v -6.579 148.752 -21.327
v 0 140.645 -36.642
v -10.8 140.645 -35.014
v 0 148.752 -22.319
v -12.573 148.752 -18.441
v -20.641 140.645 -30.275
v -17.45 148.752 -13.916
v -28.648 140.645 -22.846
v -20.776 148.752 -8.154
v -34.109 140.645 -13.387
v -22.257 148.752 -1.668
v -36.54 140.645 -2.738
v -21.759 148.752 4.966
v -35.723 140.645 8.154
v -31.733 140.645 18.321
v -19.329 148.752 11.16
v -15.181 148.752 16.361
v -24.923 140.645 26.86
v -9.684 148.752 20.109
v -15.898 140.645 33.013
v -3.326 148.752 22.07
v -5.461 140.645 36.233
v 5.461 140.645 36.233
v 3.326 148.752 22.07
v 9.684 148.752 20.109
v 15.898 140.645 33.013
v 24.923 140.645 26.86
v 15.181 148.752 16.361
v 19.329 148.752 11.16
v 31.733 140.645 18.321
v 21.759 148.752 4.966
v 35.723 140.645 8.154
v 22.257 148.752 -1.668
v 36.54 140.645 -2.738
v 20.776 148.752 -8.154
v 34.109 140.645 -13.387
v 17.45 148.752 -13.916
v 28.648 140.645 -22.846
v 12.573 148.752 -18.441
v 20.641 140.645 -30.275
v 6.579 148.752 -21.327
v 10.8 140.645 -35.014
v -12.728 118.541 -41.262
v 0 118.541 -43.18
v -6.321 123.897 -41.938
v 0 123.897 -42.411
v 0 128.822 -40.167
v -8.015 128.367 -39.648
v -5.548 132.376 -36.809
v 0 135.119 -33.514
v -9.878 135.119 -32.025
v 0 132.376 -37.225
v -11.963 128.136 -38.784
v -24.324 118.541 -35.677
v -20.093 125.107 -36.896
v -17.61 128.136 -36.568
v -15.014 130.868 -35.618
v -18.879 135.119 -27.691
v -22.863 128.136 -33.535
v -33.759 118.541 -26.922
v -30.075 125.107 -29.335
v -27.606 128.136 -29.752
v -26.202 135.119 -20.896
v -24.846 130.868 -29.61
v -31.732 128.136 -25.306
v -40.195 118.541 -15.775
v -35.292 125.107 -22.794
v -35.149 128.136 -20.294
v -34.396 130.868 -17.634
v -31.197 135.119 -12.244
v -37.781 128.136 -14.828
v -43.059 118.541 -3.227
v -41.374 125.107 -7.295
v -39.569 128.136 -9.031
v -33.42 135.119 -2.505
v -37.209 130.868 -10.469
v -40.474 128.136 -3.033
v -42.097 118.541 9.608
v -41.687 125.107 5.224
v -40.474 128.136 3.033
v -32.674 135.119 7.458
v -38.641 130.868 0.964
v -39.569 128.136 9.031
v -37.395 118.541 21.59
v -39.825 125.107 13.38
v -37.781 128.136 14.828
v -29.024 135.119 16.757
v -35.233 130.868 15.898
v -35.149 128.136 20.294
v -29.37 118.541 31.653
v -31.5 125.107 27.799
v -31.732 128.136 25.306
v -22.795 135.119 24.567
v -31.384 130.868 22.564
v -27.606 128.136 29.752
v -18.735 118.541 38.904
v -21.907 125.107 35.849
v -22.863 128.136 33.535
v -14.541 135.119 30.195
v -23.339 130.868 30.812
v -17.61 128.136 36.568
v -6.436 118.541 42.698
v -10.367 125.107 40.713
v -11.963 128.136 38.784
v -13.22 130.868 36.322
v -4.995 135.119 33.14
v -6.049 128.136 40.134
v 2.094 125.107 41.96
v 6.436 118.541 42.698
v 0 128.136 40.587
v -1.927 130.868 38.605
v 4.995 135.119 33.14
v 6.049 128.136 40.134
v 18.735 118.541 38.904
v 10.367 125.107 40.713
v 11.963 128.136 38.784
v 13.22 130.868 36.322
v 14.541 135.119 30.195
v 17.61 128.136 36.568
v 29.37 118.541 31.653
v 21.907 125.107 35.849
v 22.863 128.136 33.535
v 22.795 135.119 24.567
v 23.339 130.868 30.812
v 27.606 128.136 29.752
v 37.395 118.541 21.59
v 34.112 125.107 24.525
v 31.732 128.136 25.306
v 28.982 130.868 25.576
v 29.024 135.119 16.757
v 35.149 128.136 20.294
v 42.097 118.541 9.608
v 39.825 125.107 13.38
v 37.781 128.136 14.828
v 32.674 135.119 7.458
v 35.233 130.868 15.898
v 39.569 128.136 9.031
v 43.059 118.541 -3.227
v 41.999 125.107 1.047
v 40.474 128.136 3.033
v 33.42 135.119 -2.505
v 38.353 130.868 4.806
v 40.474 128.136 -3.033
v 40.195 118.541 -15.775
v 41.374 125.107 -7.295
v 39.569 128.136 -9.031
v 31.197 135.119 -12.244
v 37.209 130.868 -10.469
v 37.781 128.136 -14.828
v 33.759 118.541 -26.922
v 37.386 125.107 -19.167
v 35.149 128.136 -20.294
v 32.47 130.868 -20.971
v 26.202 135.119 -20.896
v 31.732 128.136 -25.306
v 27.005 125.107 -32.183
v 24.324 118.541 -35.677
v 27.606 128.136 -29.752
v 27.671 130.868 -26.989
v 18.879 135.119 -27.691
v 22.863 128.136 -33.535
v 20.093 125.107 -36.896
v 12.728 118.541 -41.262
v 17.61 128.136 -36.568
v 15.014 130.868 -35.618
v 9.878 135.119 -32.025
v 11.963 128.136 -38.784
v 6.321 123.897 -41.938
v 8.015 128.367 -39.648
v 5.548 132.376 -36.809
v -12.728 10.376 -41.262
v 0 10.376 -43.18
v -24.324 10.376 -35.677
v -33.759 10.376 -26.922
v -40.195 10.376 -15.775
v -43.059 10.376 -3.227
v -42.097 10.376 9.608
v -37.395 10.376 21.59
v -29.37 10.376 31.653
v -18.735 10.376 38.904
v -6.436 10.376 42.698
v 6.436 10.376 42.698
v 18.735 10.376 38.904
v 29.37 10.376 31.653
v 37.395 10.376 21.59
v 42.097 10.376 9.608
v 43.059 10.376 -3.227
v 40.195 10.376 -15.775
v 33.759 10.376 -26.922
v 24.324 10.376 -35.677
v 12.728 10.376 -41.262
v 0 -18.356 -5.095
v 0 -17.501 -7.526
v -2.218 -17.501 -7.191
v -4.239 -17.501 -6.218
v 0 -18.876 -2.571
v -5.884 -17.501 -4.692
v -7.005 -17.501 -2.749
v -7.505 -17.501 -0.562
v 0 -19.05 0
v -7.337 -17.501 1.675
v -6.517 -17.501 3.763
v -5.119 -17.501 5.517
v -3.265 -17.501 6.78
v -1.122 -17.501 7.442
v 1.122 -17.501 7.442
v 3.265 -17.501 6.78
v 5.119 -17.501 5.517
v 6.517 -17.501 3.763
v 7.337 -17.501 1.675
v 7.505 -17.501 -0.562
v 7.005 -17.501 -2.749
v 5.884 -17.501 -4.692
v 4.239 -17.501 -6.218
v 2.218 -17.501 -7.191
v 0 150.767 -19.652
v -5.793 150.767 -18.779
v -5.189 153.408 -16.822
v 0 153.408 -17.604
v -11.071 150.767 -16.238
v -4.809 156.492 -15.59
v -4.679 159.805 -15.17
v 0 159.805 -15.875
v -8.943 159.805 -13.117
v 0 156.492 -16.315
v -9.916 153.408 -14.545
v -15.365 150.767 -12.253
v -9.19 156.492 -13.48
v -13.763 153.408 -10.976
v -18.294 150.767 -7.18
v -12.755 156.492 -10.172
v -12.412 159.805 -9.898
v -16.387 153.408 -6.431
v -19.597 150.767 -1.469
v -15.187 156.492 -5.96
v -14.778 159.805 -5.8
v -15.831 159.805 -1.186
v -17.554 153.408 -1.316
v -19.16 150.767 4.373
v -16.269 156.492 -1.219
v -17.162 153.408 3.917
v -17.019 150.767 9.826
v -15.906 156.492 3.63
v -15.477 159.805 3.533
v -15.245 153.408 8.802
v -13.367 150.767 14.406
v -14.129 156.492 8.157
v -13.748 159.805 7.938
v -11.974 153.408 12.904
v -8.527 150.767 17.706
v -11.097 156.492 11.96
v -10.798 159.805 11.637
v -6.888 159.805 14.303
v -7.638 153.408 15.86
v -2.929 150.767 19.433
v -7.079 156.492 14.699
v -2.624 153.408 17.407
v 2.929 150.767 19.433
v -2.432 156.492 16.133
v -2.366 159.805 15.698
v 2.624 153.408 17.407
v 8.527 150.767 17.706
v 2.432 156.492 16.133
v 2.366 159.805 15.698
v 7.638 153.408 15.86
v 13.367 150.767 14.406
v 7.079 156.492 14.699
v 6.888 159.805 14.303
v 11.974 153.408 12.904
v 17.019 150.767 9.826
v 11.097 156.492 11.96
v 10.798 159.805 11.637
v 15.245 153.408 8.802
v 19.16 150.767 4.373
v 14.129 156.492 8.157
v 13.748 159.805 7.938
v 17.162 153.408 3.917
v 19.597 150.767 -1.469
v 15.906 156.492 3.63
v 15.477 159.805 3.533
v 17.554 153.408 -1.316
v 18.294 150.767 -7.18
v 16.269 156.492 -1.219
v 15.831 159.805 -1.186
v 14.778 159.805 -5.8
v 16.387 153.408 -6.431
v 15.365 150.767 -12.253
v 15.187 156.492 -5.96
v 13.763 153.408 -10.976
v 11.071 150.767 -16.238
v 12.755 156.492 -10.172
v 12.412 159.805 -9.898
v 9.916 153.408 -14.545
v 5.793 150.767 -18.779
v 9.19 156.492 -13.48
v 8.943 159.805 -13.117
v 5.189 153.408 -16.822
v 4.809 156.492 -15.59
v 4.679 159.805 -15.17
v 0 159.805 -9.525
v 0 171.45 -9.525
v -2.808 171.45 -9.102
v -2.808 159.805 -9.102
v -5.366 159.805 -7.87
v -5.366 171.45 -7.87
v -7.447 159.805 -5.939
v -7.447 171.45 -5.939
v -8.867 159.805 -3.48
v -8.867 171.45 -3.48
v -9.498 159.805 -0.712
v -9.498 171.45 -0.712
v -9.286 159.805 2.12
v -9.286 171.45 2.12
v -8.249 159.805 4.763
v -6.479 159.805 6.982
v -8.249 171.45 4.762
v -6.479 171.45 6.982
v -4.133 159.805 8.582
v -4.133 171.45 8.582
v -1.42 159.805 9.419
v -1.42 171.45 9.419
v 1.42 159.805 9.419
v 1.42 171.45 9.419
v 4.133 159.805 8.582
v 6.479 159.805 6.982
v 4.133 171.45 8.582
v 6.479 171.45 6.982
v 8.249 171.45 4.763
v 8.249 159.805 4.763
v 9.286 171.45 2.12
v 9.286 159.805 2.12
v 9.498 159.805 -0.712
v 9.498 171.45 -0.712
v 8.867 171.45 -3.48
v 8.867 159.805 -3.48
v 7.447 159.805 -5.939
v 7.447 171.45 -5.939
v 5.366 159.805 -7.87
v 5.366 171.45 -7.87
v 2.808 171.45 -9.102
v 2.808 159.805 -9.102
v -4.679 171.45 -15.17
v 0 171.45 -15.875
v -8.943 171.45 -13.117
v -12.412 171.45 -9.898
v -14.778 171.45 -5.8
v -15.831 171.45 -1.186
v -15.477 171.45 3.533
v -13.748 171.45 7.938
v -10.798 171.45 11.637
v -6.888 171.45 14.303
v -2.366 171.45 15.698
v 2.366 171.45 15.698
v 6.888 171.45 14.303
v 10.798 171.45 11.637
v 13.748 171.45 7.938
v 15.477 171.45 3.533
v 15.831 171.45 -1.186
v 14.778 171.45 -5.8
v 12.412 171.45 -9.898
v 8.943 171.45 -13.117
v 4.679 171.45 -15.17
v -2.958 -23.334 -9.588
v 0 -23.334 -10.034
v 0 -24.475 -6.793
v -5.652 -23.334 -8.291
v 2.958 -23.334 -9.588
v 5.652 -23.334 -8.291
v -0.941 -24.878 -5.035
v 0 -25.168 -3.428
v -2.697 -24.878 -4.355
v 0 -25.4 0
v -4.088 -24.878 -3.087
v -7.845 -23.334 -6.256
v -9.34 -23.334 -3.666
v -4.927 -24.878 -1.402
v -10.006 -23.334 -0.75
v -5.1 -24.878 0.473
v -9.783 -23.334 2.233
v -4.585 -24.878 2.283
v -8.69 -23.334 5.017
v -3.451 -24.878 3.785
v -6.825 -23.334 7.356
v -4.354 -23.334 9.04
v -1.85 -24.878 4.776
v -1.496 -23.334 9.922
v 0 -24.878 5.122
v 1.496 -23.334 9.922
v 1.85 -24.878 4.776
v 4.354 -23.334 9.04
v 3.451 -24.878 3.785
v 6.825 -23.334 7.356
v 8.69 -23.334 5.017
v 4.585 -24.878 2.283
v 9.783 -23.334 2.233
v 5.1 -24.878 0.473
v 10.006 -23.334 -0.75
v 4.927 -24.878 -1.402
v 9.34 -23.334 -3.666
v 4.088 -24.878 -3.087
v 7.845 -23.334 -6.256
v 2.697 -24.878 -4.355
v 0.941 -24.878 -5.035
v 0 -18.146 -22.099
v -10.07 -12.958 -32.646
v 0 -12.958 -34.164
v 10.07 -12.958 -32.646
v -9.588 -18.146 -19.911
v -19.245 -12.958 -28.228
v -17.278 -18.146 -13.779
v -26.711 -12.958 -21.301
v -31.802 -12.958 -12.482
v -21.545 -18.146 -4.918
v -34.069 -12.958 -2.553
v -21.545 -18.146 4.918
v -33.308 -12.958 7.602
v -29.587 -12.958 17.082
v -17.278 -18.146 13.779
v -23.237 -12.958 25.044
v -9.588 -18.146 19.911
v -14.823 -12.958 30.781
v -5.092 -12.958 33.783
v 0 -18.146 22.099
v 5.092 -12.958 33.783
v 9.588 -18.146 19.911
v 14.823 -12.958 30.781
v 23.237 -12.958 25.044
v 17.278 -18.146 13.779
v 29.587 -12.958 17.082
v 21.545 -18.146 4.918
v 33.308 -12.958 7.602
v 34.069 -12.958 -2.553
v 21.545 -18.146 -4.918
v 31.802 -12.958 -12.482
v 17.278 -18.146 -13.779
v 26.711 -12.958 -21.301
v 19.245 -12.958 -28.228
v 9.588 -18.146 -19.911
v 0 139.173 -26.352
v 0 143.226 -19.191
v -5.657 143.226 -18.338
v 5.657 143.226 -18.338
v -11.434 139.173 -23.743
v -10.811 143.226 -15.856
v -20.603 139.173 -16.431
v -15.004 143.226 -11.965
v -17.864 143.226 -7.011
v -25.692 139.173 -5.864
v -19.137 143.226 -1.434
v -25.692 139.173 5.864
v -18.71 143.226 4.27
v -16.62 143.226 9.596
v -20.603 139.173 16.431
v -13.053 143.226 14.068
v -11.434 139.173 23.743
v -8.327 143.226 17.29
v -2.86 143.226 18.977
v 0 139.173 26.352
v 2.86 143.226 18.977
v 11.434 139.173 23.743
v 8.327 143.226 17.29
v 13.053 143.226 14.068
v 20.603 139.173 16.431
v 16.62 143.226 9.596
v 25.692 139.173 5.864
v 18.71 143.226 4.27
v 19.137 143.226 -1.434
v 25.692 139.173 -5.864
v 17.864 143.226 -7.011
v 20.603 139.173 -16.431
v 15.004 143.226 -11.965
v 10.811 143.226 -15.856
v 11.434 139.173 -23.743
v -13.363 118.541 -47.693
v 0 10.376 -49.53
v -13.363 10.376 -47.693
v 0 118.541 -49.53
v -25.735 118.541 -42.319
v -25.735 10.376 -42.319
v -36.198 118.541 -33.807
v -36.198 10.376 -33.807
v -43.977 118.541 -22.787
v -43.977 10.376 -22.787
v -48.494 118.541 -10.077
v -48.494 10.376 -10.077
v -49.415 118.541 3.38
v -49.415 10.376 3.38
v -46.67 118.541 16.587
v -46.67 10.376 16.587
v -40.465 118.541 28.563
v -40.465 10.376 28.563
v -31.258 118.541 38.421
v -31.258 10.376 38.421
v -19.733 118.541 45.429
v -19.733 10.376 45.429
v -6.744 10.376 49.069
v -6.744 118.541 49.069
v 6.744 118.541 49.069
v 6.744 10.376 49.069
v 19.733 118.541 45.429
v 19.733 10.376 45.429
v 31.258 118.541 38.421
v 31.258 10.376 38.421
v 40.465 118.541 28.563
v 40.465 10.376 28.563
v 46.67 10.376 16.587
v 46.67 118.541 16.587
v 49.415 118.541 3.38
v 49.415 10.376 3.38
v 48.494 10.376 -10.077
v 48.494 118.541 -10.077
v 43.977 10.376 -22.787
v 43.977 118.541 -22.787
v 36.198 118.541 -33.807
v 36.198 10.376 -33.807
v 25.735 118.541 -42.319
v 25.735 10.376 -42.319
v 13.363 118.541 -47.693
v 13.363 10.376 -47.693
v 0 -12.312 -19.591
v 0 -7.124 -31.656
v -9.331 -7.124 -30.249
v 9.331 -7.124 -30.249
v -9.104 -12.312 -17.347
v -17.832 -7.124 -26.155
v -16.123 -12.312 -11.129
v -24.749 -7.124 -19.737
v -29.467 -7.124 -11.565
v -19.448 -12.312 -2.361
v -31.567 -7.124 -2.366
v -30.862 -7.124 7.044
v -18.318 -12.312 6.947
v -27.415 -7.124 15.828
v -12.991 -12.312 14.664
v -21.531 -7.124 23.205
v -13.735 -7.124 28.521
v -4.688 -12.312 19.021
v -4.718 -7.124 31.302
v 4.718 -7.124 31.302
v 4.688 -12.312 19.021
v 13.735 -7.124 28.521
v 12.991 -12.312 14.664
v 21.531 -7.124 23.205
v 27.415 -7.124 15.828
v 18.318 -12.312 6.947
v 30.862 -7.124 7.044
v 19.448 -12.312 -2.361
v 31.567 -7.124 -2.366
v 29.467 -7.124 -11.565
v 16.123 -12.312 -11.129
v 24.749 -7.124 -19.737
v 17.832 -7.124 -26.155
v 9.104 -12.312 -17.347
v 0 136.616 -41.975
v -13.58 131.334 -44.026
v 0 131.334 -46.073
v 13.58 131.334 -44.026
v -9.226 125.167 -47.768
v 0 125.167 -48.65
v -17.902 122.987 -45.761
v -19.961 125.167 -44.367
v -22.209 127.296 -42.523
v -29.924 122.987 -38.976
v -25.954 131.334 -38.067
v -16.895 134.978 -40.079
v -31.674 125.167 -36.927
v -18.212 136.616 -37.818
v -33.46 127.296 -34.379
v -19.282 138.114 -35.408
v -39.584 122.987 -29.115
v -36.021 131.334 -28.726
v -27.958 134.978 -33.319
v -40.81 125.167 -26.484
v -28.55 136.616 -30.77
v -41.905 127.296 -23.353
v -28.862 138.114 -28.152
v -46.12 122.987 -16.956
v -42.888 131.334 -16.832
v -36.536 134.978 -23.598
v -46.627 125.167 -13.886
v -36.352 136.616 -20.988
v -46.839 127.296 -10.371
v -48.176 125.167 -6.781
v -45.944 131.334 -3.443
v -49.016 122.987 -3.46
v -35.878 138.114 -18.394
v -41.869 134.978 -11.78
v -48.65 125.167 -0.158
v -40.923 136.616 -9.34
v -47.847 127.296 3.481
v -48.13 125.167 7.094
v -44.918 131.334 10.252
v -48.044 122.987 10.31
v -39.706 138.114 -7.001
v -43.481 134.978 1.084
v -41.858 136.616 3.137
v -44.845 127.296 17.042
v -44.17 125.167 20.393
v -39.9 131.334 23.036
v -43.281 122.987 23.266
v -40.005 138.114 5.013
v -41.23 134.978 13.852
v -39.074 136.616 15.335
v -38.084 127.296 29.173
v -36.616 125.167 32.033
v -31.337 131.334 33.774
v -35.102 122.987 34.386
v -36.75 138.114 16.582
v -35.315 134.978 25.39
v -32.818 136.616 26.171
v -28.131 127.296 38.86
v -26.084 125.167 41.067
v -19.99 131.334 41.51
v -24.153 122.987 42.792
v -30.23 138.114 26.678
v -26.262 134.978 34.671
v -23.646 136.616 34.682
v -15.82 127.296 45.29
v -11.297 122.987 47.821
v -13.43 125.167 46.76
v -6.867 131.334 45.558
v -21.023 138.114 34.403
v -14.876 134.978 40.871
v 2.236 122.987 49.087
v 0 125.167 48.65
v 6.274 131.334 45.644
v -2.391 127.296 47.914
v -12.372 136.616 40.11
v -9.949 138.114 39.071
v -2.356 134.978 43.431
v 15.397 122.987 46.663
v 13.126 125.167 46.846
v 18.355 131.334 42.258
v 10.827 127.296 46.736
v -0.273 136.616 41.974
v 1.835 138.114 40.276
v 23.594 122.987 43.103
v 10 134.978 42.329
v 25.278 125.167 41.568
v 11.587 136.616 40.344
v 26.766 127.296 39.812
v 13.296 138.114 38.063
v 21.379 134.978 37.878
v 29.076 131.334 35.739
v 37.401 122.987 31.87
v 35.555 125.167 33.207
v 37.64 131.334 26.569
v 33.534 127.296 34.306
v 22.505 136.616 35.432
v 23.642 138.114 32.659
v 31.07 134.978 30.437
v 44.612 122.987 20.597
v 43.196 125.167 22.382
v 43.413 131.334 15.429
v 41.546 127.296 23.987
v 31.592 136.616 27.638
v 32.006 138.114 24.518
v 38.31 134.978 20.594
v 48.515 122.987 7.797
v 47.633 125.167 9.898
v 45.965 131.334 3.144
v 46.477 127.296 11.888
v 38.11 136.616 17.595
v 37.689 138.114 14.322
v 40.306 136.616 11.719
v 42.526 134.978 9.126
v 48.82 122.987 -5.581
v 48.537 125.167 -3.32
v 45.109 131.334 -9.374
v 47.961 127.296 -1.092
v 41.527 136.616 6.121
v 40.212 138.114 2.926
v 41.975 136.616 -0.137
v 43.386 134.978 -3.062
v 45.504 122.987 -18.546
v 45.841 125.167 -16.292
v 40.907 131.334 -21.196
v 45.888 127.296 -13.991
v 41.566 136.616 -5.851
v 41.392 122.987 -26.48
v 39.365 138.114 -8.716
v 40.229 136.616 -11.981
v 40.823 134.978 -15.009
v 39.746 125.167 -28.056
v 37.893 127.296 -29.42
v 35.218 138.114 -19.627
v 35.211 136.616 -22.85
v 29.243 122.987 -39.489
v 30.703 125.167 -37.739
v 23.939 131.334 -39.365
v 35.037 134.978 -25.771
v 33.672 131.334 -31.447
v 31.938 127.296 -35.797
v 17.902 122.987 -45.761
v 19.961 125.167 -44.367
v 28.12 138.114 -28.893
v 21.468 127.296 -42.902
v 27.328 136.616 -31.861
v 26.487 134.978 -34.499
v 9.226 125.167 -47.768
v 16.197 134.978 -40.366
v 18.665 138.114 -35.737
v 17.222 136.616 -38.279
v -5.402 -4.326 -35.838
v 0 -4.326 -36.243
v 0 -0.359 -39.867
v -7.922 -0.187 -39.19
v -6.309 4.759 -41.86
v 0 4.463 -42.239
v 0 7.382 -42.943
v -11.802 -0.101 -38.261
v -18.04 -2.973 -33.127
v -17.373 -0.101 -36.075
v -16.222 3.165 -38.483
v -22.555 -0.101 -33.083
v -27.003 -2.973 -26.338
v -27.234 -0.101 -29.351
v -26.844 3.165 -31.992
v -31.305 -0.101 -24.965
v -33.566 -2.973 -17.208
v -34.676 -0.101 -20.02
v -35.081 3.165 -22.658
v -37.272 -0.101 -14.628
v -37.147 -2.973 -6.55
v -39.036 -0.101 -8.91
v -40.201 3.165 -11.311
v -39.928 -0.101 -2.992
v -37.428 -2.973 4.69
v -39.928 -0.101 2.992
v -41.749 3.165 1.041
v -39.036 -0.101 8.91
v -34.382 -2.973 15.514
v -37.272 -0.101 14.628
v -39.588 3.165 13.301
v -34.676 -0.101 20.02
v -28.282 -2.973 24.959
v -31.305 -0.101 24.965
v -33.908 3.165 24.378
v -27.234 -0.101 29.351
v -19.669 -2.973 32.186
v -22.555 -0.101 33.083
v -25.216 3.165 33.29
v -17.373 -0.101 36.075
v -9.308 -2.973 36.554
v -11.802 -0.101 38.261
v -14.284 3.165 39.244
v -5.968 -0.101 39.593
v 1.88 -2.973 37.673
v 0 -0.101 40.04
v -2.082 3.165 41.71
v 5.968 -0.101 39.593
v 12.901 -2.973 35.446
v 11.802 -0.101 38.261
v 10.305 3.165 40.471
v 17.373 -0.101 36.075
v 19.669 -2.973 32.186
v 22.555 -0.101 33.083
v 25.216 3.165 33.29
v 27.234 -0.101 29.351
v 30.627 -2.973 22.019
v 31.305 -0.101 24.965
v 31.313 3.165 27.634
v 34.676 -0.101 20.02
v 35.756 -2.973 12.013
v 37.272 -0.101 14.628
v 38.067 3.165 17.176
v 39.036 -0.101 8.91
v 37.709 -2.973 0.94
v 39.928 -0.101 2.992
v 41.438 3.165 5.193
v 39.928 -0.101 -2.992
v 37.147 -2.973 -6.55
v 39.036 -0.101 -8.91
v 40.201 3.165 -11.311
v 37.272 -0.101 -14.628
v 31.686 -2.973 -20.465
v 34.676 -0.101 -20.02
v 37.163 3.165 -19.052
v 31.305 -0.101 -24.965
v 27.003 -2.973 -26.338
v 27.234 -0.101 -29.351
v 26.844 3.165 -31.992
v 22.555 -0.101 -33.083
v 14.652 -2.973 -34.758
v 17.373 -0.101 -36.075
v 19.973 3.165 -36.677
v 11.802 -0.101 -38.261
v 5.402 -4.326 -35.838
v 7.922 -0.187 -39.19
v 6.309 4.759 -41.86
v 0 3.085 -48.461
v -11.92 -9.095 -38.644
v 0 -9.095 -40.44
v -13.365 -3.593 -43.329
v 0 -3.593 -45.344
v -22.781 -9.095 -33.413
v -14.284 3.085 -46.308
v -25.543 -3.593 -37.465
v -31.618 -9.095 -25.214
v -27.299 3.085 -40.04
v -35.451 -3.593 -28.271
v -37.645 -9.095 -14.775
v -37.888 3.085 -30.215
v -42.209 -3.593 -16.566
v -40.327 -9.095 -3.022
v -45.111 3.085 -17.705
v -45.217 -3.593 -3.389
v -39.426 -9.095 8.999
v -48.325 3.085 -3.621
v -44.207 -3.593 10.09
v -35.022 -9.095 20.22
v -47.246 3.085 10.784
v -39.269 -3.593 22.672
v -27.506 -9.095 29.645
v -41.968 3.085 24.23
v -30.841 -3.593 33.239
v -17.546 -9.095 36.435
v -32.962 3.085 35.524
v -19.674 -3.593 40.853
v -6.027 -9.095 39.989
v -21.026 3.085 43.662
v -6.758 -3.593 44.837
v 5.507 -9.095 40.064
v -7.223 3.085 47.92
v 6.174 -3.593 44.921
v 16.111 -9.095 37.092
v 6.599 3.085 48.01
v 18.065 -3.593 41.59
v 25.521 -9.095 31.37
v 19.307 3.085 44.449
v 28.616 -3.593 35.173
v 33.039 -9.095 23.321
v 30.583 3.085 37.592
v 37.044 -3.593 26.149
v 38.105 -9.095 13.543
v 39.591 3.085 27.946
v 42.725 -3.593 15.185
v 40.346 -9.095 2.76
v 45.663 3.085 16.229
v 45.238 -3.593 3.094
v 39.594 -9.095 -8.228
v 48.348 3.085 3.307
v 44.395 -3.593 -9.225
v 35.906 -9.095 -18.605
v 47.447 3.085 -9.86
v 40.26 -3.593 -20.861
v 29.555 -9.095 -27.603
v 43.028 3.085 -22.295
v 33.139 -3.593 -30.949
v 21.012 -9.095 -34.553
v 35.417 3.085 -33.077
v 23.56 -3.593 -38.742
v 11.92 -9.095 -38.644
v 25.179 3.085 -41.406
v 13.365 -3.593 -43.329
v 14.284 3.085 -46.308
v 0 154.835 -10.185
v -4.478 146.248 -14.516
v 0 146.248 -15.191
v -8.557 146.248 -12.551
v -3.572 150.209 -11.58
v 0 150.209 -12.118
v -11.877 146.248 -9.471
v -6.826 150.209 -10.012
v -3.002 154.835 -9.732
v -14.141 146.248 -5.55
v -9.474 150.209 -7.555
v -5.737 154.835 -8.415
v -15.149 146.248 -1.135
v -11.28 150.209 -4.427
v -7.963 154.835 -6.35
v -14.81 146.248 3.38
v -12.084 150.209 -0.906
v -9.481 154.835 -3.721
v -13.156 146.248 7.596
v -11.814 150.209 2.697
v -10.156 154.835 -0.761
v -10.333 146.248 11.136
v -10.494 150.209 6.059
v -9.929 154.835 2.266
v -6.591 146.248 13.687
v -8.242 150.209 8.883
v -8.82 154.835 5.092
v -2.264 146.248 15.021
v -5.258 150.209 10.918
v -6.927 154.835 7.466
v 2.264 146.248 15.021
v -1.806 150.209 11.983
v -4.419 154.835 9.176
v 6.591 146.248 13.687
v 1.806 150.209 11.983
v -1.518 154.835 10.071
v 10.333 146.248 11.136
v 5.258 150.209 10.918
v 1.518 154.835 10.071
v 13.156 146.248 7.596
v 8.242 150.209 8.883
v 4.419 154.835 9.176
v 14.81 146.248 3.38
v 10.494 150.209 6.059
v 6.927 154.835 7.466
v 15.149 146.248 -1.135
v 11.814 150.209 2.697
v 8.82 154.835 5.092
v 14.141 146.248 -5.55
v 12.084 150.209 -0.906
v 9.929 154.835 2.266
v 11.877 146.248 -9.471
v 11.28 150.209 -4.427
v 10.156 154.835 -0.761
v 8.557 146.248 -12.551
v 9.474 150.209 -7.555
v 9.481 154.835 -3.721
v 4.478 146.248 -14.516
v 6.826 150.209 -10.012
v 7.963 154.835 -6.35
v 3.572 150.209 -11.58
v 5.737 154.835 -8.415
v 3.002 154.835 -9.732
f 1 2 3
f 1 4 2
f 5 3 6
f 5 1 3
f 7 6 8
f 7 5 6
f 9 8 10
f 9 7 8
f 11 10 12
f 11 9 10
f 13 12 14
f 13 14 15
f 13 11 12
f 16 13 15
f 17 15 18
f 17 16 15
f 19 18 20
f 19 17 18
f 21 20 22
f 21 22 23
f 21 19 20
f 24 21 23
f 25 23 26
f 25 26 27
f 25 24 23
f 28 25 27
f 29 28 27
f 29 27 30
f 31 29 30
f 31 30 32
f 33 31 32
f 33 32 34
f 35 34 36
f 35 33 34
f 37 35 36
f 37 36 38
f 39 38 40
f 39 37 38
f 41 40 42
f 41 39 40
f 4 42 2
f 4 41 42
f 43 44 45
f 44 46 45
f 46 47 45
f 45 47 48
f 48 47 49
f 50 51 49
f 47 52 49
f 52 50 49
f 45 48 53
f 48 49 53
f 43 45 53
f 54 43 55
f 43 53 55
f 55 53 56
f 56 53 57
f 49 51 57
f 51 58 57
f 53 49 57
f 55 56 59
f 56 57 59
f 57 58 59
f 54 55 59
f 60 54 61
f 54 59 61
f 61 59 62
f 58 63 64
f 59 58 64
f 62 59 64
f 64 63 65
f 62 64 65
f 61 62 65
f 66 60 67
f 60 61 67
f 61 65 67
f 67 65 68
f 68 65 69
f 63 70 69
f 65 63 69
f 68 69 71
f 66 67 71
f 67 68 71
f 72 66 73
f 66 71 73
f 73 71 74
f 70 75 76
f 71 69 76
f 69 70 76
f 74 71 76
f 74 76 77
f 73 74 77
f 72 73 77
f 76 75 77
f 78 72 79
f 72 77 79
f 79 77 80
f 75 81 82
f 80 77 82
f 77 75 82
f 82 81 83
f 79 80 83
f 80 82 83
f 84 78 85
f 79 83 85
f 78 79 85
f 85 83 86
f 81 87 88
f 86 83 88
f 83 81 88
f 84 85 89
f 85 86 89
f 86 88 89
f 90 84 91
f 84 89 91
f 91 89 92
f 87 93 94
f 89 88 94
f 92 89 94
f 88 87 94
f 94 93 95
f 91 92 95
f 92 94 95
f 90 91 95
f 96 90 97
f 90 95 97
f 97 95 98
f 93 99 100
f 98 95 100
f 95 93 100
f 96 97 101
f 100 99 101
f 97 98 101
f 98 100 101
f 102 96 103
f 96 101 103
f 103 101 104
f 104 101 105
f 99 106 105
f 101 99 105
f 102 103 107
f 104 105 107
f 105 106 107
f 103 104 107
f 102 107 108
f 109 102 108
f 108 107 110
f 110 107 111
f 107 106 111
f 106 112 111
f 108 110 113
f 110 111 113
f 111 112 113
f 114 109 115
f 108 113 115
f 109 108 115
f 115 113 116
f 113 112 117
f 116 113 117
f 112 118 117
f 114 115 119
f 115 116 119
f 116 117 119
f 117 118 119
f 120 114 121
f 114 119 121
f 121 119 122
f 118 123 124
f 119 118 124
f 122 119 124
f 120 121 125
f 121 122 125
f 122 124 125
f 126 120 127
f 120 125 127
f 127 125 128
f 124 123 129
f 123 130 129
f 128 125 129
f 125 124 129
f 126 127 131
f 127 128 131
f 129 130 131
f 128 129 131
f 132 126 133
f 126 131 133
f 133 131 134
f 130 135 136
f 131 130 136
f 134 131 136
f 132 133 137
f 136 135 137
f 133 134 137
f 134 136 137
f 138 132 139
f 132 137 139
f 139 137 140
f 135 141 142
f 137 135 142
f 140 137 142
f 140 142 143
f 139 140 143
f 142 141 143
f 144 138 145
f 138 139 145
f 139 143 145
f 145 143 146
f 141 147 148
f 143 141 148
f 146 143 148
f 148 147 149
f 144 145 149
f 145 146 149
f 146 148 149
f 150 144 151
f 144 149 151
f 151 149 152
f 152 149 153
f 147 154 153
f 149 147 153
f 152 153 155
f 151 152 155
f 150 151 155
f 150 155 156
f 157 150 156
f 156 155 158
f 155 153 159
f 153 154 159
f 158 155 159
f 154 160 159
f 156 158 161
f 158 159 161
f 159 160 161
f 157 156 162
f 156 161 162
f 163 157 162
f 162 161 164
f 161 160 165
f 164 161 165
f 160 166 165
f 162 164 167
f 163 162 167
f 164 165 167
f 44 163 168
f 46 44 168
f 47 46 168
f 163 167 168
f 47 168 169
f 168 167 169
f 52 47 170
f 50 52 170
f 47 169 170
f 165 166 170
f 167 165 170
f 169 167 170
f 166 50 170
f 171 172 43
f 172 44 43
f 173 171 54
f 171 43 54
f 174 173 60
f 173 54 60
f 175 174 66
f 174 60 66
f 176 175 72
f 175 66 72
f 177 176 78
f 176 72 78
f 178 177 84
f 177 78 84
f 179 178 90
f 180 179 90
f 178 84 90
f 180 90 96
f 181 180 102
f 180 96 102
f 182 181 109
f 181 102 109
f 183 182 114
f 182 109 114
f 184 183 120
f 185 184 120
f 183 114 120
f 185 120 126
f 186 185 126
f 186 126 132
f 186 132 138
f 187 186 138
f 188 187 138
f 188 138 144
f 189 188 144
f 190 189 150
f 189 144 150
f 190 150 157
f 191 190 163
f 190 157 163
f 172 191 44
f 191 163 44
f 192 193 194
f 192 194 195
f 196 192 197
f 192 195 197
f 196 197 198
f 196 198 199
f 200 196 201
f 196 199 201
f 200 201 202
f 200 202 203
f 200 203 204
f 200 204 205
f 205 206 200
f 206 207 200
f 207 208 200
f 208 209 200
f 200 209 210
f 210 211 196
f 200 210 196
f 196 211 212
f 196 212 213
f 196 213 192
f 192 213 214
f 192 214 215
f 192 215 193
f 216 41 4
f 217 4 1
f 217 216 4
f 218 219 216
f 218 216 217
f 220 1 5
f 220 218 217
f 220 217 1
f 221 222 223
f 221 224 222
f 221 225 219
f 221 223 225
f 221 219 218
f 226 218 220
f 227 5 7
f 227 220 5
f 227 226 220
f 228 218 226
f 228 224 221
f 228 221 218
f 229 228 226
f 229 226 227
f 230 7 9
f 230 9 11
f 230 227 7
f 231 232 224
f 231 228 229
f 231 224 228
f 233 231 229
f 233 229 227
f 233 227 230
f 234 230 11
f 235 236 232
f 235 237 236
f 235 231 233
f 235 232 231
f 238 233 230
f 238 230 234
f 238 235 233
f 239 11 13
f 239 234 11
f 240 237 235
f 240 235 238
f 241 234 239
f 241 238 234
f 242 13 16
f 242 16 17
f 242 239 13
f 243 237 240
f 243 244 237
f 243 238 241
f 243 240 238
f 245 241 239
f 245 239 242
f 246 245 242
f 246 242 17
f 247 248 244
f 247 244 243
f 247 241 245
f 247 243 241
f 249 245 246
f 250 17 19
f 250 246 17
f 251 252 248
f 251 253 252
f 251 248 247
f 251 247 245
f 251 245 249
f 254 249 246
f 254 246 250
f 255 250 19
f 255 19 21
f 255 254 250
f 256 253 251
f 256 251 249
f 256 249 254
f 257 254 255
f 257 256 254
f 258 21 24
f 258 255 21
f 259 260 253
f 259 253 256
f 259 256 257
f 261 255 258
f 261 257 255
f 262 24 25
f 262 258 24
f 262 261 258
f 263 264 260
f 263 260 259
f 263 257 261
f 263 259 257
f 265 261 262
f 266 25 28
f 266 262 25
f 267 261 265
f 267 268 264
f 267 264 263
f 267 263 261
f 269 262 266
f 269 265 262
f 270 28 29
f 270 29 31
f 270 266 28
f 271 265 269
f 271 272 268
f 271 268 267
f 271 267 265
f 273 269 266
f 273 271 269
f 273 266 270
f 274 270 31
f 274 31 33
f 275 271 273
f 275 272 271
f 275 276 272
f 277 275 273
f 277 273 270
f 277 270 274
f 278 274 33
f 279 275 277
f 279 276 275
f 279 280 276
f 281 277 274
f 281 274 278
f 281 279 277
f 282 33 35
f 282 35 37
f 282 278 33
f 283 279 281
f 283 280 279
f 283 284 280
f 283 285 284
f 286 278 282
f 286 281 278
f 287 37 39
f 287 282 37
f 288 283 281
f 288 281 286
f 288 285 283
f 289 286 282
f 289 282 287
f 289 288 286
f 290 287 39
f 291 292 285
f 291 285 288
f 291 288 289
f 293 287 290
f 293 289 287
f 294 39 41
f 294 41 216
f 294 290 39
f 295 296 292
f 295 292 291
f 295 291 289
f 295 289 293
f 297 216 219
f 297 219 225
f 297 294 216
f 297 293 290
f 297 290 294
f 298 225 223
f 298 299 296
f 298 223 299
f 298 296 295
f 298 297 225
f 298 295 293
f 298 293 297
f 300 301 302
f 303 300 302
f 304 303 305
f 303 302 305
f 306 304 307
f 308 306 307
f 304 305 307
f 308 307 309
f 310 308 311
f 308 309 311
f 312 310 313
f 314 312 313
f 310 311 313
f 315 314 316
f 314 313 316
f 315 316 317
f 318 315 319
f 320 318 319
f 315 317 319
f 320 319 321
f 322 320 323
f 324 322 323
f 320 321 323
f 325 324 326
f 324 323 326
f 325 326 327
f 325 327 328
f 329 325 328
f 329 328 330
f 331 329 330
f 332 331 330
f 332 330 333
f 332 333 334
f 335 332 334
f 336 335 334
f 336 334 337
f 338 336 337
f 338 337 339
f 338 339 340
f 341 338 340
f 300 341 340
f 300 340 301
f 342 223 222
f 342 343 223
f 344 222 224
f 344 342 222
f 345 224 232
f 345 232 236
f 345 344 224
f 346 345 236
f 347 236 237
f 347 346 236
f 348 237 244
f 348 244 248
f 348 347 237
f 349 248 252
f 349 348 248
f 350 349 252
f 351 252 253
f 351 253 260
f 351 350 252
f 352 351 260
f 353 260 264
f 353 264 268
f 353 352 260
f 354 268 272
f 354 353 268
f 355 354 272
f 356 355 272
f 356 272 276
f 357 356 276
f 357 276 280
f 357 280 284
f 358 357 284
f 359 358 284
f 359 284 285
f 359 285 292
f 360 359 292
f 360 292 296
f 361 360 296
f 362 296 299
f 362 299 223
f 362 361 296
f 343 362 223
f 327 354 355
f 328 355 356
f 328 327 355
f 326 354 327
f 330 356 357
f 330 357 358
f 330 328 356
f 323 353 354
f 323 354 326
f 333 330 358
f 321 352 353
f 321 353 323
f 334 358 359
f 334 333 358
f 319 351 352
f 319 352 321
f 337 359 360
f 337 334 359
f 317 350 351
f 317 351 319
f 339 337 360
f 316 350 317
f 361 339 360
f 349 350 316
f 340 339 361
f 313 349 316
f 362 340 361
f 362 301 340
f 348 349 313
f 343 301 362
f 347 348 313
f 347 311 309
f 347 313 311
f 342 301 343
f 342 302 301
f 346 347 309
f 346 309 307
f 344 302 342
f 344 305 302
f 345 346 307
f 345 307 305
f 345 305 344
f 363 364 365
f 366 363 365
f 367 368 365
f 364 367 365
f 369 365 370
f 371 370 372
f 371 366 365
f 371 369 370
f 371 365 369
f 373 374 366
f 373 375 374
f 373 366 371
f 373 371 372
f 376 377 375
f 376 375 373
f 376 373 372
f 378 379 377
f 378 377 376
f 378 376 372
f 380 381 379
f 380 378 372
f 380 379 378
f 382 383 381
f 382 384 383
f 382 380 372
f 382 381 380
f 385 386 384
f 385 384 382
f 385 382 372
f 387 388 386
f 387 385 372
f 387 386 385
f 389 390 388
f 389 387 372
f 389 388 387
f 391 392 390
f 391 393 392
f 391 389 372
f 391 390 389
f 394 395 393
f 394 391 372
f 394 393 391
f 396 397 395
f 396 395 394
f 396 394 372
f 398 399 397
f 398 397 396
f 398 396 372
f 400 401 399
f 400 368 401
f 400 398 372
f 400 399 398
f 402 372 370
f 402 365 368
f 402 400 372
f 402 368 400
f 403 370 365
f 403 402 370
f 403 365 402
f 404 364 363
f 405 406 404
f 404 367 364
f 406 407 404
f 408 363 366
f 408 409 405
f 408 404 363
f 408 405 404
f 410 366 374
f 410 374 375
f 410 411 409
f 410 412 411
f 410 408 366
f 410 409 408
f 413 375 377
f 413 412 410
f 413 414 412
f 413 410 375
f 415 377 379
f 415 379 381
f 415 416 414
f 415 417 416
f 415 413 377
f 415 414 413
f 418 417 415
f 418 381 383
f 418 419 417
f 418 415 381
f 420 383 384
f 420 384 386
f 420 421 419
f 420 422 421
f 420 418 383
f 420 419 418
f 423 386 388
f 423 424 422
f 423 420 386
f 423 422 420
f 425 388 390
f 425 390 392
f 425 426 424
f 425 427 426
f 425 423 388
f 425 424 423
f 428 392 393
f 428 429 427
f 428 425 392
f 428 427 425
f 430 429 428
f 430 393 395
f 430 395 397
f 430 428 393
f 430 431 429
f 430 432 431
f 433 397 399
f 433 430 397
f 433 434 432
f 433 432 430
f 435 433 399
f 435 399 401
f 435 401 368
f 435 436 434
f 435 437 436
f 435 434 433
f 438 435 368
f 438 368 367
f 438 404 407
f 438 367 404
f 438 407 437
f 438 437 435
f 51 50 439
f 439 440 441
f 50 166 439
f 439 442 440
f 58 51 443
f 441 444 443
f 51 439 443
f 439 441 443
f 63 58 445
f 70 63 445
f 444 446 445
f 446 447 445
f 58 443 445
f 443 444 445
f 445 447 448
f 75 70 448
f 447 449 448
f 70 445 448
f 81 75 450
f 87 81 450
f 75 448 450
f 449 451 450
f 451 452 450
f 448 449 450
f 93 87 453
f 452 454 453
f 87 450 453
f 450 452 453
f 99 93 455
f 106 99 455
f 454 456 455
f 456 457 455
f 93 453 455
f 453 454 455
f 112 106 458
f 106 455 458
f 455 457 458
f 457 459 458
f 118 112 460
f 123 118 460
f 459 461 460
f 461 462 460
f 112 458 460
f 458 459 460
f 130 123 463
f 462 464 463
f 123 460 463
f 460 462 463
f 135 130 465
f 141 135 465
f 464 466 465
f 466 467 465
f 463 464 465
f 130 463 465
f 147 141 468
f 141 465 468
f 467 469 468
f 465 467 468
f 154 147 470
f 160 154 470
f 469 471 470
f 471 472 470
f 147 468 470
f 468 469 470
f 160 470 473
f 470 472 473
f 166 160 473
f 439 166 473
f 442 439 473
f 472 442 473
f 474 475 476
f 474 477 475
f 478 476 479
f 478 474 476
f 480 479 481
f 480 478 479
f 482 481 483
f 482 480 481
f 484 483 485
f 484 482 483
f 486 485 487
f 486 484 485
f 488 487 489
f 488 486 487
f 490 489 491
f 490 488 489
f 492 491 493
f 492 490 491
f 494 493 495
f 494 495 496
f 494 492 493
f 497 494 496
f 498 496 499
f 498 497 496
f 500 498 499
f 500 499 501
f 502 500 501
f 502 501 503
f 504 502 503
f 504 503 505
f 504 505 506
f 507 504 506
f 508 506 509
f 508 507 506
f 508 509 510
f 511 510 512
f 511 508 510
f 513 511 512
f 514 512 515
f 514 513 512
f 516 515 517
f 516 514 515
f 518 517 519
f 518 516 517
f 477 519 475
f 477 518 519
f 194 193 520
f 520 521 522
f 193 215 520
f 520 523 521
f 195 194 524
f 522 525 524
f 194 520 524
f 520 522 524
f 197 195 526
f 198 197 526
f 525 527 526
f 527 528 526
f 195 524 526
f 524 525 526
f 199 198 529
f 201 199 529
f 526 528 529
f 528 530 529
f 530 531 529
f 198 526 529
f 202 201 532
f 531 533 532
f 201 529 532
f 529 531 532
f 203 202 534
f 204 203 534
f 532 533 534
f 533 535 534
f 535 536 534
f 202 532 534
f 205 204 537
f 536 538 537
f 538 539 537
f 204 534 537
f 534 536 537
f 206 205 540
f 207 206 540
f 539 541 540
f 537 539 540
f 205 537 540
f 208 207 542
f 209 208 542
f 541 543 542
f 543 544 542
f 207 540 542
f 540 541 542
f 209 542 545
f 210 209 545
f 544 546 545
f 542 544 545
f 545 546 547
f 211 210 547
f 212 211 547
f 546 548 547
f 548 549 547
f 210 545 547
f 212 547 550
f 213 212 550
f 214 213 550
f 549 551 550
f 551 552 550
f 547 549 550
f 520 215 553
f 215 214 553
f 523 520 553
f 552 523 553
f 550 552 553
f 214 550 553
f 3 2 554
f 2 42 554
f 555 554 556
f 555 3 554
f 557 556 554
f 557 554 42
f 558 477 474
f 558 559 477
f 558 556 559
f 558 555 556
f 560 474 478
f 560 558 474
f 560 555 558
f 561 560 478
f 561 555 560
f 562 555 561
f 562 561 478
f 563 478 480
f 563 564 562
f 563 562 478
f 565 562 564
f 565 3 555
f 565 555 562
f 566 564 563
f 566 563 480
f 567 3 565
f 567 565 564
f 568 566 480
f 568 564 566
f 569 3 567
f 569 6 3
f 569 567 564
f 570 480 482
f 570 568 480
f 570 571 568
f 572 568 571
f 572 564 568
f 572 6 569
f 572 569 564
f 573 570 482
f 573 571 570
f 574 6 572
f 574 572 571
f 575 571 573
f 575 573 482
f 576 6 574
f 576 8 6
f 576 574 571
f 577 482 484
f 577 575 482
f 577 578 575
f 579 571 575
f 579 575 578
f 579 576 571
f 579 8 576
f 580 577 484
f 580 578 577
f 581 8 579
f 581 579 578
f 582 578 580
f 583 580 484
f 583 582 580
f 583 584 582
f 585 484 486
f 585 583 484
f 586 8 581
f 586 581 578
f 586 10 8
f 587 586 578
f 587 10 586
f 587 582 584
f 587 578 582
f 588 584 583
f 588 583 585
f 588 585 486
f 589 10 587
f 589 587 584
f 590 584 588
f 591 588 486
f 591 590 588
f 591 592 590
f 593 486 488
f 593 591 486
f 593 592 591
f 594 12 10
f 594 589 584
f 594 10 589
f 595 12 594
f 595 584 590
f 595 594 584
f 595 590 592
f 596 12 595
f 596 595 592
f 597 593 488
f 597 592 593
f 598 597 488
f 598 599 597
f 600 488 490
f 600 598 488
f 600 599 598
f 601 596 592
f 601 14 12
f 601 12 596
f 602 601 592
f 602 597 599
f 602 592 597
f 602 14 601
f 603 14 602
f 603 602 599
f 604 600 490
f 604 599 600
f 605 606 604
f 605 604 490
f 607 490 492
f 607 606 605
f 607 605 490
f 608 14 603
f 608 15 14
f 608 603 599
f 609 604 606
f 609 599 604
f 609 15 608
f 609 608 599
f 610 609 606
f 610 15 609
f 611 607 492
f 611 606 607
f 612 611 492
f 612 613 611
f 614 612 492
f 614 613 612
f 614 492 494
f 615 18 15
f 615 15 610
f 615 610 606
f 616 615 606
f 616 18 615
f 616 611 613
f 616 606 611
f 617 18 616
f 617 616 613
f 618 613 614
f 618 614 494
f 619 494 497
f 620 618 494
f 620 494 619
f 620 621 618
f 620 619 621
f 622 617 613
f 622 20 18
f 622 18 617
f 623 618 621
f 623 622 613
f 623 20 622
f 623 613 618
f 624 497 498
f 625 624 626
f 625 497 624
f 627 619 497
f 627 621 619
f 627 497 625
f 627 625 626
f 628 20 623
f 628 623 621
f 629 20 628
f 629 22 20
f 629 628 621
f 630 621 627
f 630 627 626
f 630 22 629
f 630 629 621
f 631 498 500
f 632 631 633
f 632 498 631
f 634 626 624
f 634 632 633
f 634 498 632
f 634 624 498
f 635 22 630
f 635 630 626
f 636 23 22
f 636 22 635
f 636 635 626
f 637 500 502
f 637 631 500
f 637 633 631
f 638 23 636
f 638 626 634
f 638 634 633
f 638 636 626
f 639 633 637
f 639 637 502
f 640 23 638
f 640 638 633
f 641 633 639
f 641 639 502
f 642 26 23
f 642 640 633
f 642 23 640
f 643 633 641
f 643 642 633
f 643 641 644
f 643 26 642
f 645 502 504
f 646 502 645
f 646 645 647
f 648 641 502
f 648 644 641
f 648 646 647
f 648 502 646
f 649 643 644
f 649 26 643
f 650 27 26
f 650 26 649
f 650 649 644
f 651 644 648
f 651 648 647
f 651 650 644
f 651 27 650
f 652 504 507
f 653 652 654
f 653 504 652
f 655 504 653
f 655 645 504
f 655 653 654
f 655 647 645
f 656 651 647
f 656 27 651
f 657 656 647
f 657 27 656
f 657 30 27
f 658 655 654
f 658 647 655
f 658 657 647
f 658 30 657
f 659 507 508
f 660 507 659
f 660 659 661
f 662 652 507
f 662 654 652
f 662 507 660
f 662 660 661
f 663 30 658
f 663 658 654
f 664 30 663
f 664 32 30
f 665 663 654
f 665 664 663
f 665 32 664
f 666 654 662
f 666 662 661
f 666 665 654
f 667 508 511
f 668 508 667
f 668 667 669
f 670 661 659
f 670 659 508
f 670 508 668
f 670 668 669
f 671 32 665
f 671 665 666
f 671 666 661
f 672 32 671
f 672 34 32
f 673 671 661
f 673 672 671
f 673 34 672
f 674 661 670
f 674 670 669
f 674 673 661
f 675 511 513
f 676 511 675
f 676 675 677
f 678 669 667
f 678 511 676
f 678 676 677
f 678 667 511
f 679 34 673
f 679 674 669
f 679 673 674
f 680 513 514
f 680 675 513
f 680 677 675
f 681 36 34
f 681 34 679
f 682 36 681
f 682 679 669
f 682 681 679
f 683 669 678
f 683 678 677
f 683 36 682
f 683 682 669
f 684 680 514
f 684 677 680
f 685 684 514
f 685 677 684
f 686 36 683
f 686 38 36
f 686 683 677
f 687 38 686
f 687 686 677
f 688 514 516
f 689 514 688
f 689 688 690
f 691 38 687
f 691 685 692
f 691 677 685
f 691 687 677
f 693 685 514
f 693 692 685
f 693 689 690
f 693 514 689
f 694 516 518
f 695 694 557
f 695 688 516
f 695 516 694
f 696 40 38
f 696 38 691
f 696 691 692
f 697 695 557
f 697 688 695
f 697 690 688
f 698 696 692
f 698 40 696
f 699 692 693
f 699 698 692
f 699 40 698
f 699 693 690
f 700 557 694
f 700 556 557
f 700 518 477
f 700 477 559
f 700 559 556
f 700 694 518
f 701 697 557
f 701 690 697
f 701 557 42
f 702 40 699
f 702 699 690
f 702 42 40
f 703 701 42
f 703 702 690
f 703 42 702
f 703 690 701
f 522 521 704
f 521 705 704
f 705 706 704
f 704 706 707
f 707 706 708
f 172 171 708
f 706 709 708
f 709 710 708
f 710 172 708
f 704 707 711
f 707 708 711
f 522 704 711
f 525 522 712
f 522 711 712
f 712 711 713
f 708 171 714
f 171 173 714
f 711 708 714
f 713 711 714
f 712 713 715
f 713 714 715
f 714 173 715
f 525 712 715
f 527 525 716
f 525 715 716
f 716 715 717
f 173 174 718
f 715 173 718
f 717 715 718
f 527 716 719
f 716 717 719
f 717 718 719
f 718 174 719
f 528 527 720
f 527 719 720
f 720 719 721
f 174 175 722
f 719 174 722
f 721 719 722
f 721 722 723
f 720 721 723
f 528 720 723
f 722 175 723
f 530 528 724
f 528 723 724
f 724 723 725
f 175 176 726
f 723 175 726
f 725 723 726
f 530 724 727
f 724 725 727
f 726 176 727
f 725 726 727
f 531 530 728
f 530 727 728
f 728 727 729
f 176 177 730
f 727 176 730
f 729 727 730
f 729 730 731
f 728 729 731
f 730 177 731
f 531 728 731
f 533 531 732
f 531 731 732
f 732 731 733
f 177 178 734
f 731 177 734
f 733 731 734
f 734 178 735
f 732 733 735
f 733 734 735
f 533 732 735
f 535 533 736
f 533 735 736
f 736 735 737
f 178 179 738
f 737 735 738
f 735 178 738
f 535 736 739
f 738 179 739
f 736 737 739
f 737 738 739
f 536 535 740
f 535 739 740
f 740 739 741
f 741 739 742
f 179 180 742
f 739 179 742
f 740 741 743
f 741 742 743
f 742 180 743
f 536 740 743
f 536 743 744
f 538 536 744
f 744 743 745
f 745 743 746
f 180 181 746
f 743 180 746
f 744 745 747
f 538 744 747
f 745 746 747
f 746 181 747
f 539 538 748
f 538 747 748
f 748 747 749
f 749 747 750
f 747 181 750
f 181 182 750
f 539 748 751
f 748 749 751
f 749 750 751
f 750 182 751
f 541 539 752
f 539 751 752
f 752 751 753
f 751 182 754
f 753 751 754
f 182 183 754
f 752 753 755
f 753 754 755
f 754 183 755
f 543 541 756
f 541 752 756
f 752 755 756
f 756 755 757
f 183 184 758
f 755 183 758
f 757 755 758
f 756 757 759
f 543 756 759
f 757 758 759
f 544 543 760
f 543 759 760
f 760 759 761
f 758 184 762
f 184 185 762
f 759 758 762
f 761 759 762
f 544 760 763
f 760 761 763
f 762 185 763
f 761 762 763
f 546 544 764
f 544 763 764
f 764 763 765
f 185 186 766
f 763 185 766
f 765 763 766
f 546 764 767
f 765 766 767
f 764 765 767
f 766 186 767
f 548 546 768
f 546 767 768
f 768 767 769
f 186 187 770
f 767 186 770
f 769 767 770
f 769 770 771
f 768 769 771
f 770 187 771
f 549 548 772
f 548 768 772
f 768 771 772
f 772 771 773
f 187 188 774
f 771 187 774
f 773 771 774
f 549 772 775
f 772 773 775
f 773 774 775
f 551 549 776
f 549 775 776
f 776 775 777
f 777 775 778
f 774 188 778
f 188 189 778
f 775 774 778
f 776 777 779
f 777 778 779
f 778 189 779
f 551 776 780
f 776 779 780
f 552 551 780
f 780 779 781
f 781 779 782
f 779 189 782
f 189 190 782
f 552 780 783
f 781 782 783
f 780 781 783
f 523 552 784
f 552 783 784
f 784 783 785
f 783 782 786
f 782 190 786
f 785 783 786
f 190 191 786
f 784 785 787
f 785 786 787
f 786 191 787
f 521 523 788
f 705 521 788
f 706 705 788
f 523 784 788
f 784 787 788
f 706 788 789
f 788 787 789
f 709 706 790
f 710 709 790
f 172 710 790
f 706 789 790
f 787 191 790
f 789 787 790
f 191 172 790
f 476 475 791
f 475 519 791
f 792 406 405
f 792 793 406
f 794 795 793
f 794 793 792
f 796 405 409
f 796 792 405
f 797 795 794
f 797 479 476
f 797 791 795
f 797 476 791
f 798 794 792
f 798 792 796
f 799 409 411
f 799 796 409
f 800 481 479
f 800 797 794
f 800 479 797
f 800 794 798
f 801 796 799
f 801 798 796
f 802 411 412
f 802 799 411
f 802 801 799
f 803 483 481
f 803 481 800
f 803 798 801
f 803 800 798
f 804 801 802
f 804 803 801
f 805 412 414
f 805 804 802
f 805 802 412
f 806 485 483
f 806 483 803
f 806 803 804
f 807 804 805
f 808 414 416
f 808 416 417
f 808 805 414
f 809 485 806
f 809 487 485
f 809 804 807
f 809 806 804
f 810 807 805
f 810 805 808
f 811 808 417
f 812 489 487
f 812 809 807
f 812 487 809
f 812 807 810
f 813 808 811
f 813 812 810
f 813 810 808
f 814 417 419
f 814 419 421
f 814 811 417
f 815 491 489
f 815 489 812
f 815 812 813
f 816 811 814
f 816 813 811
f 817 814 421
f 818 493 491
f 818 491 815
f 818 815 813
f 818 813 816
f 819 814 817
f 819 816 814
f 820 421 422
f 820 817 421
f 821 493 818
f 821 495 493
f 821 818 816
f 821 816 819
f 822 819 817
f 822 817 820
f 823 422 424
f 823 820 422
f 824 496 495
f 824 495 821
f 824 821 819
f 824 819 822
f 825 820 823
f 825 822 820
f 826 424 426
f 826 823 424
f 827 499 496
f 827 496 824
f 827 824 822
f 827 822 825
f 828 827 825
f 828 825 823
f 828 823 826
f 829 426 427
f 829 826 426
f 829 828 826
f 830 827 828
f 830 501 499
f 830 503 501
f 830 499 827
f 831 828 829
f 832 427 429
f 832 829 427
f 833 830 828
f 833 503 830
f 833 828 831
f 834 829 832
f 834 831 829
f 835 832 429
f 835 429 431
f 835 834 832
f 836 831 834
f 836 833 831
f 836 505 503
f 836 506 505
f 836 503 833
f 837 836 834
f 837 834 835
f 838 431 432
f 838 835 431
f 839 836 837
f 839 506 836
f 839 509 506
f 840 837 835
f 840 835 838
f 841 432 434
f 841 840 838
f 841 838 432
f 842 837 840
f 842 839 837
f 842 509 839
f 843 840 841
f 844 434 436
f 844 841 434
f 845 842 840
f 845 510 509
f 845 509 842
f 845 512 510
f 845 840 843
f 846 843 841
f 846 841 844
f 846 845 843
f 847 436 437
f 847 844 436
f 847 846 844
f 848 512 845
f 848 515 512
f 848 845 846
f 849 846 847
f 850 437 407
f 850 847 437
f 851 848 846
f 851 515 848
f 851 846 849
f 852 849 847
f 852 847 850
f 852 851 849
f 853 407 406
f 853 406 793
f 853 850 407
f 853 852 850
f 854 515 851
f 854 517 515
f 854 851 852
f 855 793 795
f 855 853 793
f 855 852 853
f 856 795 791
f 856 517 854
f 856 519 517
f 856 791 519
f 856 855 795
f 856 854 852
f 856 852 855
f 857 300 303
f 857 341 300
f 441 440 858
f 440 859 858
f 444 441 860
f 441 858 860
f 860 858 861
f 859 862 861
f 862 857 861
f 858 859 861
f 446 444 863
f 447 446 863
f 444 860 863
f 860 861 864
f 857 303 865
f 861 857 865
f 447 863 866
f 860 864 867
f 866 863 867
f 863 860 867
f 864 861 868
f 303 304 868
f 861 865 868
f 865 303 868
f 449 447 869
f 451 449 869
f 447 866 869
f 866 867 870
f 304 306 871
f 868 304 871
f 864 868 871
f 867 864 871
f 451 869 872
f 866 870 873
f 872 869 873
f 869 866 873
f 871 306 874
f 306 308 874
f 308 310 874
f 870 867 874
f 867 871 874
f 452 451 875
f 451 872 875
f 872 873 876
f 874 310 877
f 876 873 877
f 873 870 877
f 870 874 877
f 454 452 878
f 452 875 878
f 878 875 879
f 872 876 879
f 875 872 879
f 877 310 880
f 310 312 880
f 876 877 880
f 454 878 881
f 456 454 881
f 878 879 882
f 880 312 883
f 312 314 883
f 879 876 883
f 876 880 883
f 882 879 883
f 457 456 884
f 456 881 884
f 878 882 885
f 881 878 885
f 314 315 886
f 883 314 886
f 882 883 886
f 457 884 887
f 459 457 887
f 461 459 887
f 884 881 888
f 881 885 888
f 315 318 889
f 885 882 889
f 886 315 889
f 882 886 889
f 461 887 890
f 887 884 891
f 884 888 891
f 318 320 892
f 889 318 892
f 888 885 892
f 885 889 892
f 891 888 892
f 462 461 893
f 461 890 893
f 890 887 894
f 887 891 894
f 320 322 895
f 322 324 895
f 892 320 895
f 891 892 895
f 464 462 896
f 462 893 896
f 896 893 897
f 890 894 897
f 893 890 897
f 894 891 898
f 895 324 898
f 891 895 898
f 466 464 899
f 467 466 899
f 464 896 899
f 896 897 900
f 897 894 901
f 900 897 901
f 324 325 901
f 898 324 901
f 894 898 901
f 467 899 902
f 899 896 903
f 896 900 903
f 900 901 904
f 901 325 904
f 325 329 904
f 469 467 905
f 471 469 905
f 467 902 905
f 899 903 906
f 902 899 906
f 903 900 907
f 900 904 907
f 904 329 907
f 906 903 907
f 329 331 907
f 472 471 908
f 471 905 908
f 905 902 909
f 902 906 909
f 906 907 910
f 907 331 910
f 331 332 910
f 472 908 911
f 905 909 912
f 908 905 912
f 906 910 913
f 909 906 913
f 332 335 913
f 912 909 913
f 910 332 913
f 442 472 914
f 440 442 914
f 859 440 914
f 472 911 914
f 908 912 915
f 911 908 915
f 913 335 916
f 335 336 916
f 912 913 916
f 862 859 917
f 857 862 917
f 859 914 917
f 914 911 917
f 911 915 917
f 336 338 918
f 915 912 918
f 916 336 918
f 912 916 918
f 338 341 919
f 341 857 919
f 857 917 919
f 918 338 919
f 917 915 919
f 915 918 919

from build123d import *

# Parameters (mm, degrees)
SHELL1_T = -6.35


with BuildPart() as part:
    # Sketch1 → Revolve1 (revolve)
    with BuildSketch(Plane.XY, mode=Mode.PRIVATE) as revolve1_sk:
        with BuildLine():
            Line((-10.034098989, -23.334027888), (-34.164098989, -12.957644961))
            ThreePointArc((-34.164098989, -12.957644961), (-45.343511193, -3.593117524), (-49.53, 10.376382927))
            Line((-49.53, 10.376382927), (-49.53, 118.540573173))
            ThreePointArc((-49.53, 118.540573173), (-46.072705707, 131.334230439), (-36.641994784, 140.645097292))
            Line((-36.641994784, 140.645097292), (-22.319002608, 148.752451354))
            ThreePointArc((-22.319002608, 148.752451354), (-17.603647146, 153.40788478), (-15.875, 159.804713413))
            Line((-15.875, 159.804713413), (-15.875, 171.45))
            Line((-15.875, 171.45), (0, 171.45))
            Line((0, 171.45), (0, -25.4))
            ThreePointArc((0, -25.4), (-5.122289119, -24.878146116), (-10.034098989, -23.334027888))
        make_face()
    revolve(revolve1_sk.sketch.rotate(Axis((0, 0, 0), (0, 1, 0)), 270), axis=Axis((0, 0, 0), (0, 1, 0)))

    # Shell1
    shell1_openings = [part.faces().sort_by_distance(p)[0] for p in [
        (0, 171.45, 0),
    ]]
    offset(amount=SHELL1_T, openings=shell1_openings, kind=Kind.INTERSECTION)


solid = part.part
